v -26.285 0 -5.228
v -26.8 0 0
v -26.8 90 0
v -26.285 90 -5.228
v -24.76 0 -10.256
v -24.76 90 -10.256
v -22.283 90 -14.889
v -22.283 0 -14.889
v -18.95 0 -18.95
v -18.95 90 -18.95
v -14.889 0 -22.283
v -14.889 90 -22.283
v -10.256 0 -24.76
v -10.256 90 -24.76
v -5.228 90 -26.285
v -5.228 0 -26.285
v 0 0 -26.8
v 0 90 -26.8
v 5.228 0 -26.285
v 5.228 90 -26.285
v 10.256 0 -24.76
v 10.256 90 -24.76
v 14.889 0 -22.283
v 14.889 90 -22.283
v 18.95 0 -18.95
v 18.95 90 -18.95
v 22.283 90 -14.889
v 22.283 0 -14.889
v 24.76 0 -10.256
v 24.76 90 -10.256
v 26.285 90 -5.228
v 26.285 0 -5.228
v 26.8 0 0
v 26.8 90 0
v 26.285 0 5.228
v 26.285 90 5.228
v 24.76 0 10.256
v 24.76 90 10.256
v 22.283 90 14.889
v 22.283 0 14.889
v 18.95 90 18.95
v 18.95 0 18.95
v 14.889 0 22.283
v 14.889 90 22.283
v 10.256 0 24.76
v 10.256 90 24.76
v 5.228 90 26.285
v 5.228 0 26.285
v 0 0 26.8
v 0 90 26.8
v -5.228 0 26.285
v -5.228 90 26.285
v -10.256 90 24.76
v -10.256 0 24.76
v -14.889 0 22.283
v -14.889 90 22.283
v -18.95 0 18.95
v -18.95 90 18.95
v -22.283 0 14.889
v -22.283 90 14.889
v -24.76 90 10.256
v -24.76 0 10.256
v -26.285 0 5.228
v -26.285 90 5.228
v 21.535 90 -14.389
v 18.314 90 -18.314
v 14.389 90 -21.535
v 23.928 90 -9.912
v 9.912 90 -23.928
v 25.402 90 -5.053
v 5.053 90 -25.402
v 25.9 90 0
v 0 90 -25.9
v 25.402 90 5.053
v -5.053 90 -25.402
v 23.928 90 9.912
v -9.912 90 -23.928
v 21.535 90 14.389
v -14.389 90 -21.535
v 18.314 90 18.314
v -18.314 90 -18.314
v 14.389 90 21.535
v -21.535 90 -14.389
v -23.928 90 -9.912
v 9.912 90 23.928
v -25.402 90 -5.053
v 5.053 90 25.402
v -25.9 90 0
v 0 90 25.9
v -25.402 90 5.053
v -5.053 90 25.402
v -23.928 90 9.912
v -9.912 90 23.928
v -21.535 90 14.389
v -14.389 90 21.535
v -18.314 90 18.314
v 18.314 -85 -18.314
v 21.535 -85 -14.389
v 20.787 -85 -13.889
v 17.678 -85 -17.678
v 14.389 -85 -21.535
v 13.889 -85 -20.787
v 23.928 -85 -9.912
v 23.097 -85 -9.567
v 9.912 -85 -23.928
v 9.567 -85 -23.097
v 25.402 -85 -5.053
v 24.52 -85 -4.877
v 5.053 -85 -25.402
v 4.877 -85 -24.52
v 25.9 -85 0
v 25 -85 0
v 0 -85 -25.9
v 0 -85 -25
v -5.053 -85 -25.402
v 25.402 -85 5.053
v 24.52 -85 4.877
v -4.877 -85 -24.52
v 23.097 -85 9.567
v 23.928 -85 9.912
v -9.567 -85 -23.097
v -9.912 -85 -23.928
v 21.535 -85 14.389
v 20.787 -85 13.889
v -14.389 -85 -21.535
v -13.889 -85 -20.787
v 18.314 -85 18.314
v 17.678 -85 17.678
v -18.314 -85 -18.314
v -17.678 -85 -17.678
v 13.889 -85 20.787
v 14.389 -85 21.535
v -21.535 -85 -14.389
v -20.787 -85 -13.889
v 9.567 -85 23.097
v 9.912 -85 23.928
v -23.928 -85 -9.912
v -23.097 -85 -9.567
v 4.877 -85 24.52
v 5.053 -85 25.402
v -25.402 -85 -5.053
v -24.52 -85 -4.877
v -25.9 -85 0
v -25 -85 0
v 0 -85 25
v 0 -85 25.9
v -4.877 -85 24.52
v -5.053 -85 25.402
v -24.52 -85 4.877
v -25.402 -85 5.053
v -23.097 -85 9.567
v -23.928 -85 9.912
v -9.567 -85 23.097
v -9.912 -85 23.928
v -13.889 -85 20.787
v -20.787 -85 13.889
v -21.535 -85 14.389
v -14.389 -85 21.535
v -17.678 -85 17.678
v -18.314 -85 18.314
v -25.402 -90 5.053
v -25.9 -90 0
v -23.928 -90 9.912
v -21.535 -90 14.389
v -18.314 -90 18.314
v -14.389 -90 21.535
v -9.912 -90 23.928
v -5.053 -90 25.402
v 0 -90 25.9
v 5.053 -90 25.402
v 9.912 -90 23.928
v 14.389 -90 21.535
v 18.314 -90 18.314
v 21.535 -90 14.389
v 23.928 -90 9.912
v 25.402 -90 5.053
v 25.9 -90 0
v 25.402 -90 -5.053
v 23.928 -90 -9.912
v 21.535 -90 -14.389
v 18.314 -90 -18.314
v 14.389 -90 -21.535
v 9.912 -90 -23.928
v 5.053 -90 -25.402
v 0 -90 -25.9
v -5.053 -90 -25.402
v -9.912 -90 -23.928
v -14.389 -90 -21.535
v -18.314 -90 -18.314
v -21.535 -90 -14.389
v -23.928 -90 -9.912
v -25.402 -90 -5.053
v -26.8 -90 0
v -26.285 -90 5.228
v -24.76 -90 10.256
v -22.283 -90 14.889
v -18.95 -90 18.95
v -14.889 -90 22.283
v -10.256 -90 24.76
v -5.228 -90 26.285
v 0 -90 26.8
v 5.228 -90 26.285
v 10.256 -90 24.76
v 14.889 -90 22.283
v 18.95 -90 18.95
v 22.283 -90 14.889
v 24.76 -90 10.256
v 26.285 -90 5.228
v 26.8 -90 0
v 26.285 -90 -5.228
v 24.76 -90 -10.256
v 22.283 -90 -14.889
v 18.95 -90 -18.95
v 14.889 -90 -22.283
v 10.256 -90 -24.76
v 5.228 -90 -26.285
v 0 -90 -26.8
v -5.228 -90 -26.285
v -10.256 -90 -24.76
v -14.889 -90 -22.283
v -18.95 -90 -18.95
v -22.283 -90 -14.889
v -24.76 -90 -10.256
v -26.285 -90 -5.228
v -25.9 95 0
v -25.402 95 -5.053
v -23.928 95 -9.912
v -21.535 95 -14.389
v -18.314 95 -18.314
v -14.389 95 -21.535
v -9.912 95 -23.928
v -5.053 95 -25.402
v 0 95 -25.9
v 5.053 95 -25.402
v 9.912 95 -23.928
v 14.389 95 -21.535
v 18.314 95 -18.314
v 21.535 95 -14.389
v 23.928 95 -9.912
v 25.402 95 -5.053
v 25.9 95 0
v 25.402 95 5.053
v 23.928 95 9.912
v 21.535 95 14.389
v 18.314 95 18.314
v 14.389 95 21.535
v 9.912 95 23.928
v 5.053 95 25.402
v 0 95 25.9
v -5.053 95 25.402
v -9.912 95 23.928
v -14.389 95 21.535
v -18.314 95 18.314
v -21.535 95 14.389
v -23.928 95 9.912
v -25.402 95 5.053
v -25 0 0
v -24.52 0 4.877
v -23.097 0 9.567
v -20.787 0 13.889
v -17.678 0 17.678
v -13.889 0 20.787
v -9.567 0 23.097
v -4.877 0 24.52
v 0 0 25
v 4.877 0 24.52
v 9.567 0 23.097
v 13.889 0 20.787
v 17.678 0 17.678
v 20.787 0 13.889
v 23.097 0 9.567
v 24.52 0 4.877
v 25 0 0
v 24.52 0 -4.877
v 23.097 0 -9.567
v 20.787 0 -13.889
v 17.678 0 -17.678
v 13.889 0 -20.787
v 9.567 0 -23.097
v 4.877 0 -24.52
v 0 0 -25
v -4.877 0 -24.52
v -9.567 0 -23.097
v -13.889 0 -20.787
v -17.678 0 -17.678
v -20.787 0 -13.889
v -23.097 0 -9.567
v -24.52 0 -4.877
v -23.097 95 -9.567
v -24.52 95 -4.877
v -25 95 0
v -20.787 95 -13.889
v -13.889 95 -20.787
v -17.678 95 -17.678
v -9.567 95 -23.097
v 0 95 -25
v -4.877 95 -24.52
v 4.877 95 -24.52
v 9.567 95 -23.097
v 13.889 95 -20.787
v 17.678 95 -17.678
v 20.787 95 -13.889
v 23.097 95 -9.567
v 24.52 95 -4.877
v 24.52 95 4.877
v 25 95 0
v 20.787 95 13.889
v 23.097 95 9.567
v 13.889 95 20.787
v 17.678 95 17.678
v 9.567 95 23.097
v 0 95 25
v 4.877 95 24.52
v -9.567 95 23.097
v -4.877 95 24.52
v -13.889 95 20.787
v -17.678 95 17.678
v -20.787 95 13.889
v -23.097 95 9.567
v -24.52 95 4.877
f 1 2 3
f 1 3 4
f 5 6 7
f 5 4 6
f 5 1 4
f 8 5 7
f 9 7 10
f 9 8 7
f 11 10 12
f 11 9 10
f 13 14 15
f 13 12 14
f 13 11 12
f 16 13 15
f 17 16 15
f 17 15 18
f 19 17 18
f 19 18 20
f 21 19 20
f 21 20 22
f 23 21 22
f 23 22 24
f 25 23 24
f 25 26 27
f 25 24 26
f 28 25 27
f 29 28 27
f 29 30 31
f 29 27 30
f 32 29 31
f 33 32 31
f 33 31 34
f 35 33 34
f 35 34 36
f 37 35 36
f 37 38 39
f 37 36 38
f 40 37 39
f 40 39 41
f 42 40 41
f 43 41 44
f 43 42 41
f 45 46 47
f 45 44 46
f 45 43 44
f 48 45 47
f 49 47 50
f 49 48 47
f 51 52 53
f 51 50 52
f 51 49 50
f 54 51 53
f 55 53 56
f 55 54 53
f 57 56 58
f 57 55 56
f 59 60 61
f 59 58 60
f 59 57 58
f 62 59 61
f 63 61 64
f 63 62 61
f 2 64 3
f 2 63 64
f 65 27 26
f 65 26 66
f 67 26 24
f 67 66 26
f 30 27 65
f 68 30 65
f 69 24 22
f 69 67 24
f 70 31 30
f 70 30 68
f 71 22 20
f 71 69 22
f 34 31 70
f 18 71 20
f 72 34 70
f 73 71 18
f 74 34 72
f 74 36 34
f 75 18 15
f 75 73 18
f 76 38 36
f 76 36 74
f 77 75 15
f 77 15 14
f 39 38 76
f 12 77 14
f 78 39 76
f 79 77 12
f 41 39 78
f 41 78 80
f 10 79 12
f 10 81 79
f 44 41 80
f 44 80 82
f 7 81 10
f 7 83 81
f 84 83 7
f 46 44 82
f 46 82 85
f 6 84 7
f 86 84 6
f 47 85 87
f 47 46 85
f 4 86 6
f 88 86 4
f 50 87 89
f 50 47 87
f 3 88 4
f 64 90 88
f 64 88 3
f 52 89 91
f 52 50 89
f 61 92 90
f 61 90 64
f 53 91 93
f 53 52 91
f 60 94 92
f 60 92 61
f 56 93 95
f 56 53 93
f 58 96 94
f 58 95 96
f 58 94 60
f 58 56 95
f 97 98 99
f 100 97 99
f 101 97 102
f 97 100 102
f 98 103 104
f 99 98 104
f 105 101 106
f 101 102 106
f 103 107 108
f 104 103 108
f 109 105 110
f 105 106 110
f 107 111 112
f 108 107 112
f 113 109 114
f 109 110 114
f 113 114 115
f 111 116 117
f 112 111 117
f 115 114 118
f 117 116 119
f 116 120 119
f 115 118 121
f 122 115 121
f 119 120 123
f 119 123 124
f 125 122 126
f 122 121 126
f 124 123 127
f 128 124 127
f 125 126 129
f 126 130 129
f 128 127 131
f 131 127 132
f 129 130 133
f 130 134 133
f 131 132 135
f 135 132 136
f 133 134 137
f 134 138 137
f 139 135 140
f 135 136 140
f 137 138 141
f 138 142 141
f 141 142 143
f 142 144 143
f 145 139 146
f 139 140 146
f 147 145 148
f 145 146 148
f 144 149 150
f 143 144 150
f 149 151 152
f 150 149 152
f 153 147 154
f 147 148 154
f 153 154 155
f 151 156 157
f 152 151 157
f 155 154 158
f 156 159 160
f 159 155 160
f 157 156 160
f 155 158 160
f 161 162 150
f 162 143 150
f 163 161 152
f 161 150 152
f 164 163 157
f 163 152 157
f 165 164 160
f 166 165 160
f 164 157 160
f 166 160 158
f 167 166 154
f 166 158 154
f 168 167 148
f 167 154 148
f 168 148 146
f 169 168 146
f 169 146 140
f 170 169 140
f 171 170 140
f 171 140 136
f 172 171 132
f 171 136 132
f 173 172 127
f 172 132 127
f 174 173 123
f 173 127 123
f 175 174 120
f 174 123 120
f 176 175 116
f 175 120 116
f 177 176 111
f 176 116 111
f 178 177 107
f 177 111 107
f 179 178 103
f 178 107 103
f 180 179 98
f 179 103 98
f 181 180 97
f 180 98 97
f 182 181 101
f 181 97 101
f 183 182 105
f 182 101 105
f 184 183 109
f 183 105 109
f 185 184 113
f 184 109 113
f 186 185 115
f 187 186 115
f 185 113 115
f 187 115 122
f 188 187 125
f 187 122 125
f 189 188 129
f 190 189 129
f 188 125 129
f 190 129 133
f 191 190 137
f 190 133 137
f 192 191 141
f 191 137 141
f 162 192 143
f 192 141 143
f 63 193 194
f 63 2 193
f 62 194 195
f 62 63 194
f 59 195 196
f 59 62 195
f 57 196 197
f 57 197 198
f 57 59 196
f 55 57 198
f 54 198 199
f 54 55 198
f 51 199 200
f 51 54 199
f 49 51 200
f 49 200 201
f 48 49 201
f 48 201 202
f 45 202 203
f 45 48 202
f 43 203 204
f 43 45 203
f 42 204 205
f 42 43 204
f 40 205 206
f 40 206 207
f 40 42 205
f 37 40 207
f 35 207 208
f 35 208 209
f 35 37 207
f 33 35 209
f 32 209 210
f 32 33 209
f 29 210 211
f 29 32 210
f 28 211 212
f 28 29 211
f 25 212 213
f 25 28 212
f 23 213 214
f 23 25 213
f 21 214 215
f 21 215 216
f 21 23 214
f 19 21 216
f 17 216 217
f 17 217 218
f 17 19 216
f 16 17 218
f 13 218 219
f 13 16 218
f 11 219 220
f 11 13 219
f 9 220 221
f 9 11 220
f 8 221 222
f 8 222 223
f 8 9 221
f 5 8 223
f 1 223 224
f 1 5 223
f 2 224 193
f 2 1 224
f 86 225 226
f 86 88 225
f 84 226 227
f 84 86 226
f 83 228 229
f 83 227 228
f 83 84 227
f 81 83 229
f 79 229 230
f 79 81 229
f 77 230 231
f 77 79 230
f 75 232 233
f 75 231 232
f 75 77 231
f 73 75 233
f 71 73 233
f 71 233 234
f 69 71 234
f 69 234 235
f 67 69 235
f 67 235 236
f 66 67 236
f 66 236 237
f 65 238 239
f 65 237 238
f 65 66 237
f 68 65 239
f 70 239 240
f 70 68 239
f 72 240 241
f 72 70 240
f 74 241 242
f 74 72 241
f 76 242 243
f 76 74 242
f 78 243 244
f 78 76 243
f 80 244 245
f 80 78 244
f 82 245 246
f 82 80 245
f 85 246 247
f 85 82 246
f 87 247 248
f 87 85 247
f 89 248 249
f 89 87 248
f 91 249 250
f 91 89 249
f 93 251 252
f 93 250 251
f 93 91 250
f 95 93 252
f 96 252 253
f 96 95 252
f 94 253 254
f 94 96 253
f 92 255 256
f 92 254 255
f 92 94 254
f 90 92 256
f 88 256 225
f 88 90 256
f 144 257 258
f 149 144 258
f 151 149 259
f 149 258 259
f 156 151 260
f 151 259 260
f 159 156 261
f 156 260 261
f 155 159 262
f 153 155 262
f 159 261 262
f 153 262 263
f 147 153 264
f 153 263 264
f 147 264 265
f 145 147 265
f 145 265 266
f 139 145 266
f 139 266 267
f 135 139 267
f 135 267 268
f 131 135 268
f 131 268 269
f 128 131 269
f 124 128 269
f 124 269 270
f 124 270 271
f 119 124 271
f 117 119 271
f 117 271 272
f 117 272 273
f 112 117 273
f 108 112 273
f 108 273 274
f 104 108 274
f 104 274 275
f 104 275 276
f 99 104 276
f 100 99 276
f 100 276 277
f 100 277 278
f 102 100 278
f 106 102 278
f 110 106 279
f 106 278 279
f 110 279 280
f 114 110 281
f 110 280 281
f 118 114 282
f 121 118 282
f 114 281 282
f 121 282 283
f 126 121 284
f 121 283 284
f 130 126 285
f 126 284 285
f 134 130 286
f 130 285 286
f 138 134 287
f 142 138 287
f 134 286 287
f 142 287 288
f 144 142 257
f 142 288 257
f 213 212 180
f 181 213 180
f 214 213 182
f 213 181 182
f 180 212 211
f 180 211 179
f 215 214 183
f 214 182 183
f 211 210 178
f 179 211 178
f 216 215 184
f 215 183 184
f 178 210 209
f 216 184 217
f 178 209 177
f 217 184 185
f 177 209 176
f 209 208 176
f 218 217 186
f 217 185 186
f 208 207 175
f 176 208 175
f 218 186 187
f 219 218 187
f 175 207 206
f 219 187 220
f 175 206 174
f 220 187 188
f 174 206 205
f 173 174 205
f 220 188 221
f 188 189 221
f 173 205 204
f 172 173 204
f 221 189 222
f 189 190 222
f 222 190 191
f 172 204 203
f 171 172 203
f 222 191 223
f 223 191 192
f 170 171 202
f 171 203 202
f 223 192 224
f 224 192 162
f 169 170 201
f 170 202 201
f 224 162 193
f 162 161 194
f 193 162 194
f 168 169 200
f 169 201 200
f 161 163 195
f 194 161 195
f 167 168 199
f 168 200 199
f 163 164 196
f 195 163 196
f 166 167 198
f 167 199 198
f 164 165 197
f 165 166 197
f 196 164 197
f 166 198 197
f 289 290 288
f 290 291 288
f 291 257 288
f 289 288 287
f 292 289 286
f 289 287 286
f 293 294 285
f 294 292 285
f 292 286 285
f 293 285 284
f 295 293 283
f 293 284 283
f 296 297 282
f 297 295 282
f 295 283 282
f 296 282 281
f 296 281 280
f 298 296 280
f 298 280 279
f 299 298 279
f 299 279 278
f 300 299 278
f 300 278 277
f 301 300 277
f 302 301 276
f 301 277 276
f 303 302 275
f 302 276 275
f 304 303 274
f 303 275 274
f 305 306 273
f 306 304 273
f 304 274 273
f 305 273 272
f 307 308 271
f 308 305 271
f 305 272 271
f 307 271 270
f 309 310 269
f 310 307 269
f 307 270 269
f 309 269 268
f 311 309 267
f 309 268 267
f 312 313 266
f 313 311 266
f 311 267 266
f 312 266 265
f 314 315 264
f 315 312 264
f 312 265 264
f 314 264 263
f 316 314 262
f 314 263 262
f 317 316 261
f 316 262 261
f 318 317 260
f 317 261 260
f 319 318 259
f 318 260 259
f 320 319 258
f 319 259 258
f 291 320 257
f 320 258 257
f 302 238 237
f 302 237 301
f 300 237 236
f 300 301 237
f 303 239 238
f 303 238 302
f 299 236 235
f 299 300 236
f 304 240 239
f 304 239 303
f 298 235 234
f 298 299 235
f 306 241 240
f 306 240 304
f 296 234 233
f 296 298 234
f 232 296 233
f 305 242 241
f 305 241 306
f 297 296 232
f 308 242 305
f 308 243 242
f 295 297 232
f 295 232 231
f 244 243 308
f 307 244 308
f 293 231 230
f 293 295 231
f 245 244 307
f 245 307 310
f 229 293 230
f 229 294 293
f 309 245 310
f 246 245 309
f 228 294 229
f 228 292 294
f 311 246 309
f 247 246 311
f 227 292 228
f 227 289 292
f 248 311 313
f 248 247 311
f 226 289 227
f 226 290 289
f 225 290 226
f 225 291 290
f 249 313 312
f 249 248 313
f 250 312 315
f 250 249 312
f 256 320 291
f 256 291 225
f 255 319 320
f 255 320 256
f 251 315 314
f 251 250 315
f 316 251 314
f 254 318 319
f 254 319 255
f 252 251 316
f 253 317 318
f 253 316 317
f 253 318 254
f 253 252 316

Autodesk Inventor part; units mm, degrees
ref_plane "YZ Plane" through (0, 0, 0) normal (1, 0, 0) x (0, 1, 0)
ref_plane "XZ Plane" through (0, 0, 0) normal (0, 1, 0) x (-1, 0, 0)
ref_plane "XY Plane" through (0, 0, 0) normal (0, 0, 1) x (1, 0, 0)
sketch "Sketch1" plane through (0, 0, 0) normal (0, 1, 0) x (-1, 0, 0)
  circle A0 centre (0, 0) radius 25.9
  circle A1 centre (0, 0) radius 25
  circle A2 centre (0, 0) radius 26.8
  dimension "d0" = 51.8
  dimension "d1" = 50
  dimension "d2" = 53.6
extrude "Extrusion1" add sketch "Sketch1" along normal blind 95 and the other way blind 85 contours A0
extrude "Extrusion2" add sketch "Sketch1" along normal mid plane 180 contours A2
properties part number "payloadchamber" material "ABS Plastic"
